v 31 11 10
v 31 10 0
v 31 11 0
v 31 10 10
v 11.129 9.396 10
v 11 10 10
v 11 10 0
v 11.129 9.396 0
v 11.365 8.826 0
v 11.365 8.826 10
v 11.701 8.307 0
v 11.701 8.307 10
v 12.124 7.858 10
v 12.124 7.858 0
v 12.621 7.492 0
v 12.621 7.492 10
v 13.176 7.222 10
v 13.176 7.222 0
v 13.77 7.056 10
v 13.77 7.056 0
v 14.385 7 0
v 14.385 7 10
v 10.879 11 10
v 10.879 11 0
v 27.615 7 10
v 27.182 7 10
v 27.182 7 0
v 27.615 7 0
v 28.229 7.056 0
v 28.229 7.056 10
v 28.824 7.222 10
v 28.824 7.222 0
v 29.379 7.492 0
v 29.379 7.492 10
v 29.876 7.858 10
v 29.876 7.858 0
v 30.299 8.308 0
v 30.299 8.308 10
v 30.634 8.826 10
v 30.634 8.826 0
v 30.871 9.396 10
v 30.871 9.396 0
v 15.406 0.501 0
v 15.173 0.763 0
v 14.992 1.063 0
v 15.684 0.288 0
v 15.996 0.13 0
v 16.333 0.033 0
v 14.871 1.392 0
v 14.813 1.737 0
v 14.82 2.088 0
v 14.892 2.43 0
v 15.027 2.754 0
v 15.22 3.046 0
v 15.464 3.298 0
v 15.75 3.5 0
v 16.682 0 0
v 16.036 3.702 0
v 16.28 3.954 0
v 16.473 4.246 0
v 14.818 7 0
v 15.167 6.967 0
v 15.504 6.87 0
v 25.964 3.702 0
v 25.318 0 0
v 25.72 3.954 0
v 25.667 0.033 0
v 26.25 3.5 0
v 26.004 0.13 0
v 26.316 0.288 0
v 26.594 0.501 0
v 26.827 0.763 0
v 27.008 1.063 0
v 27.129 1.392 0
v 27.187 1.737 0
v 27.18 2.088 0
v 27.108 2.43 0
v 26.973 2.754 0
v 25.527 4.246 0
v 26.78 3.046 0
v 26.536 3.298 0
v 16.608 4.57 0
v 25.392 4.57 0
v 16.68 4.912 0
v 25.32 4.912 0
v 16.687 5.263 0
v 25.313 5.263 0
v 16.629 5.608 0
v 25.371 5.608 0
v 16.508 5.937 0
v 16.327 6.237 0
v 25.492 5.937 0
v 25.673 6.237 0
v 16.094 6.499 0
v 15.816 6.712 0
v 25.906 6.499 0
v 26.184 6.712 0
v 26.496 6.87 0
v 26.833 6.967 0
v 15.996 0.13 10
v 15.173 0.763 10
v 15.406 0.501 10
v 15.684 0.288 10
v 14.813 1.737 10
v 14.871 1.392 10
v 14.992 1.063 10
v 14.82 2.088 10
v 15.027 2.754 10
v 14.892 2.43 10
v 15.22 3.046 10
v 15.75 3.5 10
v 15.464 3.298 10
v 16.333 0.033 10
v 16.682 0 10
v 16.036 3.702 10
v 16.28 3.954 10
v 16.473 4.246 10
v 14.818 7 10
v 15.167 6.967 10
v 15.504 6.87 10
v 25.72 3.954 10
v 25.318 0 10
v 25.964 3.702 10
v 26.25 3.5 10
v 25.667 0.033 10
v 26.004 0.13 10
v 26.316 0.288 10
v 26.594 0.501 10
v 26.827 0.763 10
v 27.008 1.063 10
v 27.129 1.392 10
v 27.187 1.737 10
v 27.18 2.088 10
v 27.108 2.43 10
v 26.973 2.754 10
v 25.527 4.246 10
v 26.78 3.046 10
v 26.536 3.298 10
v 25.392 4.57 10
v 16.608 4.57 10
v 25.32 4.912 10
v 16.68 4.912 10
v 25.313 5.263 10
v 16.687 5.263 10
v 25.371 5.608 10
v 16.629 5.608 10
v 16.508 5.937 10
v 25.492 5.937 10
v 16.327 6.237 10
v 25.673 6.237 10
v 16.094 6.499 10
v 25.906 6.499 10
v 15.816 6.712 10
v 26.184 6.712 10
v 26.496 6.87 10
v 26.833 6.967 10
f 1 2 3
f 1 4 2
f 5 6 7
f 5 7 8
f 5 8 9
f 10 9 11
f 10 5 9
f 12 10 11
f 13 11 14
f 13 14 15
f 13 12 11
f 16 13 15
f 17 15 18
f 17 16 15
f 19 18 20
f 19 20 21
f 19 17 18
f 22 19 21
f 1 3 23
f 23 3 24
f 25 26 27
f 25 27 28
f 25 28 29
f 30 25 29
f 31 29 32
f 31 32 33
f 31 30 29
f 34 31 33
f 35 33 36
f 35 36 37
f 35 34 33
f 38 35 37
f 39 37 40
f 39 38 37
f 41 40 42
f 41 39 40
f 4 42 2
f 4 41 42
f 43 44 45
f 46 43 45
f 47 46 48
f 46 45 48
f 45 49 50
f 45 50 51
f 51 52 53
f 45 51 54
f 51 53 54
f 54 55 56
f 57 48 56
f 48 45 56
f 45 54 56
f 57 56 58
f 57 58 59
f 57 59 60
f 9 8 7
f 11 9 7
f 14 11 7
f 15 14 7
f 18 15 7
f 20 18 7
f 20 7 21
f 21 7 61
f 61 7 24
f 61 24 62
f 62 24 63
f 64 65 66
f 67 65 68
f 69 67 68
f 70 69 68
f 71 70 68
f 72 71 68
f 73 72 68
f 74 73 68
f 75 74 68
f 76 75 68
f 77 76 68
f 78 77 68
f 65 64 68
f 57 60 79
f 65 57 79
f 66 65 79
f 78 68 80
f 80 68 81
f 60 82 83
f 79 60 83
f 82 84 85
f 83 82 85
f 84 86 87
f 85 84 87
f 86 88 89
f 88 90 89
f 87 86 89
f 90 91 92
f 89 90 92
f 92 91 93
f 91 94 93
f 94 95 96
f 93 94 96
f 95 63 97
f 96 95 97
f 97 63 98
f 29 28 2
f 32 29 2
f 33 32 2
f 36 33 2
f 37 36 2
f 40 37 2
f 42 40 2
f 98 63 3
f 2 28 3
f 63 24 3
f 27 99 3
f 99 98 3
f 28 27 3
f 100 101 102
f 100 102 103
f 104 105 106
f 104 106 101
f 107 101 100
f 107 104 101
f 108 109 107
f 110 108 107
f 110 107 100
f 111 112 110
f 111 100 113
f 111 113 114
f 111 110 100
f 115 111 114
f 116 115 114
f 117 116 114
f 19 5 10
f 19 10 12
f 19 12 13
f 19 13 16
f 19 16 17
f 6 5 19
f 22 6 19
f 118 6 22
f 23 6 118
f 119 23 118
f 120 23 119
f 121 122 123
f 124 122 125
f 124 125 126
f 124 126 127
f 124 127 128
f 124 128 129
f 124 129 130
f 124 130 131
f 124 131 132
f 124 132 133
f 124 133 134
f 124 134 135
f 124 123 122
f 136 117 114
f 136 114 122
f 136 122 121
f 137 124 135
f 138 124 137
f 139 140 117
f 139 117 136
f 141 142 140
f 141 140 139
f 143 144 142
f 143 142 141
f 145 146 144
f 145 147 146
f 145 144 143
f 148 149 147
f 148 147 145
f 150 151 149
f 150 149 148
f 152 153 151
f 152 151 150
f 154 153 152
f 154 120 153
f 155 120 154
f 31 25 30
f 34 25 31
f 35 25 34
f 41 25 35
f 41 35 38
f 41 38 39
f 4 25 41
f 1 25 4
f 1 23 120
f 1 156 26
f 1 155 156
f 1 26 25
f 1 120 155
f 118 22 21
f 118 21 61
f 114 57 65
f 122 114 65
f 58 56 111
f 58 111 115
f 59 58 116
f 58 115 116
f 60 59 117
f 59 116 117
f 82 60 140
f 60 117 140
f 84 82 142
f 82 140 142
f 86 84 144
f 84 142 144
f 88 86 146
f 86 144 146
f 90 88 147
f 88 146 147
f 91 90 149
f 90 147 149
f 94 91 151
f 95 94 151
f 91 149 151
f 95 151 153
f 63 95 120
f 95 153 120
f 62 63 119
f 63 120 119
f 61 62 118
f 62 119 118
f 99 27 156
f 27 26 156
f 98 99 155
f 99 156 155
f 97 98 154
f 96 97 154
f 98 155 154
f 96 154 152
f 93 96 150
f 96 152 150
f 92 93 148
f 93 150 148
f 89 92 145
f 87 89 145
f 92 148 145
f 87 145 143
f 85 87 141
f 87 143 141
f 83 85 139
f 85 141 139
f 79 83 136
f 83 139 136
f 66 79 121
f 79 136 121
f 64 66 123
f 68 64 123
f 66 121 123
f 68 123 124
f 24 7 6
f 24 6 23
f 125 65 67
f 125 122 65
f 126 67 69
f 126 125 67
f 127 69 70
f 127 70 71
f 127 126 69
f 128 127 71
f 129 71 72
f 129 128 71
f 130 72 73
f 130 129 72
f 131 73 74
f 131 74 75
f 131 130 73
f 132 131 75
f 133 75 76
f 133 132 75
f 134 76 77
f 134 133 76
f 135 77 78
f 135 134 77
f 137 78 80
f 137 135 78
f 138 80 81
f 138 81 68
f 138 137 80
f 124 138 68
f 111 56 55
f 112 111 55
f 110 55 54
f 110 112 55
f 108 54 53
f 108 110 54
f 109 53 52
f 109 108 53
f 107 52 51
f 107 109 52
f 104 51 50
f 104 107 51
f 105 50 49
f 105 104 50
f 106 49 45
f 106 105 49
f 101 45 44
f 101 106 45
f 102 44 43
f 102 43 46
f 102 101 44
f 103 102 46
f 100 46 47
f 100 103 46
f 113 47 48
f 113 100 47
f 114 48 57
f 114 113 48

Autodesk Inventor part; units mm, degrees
ref_plane "YZ Plane" through (0, 0, 0) normal (1, 0, 0) x (0, 1, 0)
ref_plane "XZ Plane" through (0, 0, 0) normal (0, 1, 0) x (-1, 0, 0)
ref_plane "XY Plane" through (0, 0, 0) normal (0, 0, 1) x (1, 0, 0)
sketch "Sketch1" plane through (0, 0, 0) normal (0, 0, 1) x (1, 0, 0)
  line L0 (0, 0) -> (21, 0)
  line L1 (21, 0) -> (21, 11)
  line L2 (21, 11) -> (0, 11)
  line L3 (0, 11) -> (0, 0)
  dimension "d0" = 21
  dimension "d1" = 11
extrude "Extrusion1" add sketch "Sketch1" along normal blind 10
sketch "Sketch2" plane through (0, 0, 10) normal (0, 0, 1) x (1, 0, 0)
  line L0 (0, 0) -> (21, 0) projected
  arc A0 (4.3181, 0) -> (5.25, 3.5) centre (4.3181, 1.8741) ccw
  arc A1 (6.1819, 7) -> (5.25, 3.5) centre (6.1819, 5.1259) ccw
  arc A2 (15.75, 3.5) -> (16.6819, 0) centre (16.6819, 1.8741) ccw
  arc A3 (15.75, 3.5) -> (14.8181, 7) centre (14.8181, 5.1259) ccw
  line L1 (6.1819, 7) -> (14.8181, 7)
  line L2 (21, 11) -> (0, 11) projected
  line L3 (4.3181, 1.8741) -> (6.1819, 5.1259) construction
  line L4 (16.6819, 1.8741) -> (14.8181, 5.1259) construction
  line L5 (0, 11) -> (0, 0) construction
  line L6 (21, 0) -> (21, 11) construction
  point P0 (10.5, 7)
  point P1 (15.75, 3.5)
  dimension "d7" = 10.5
  dimension "d9" = 7
  dimension "d13" = 10.5
extrude "Extrusion2" cut sketch "Sketch2" against normal through all
sketch "Sketch3" plane through (0, 0, 10) normal (0, 0, 1) x (1, 0, 0)
  line L0 (21, 11) -> (0, 11) projected
  line L1 (14.8181, 7) -> (6.1819, 7) projected
  arc A0 (6.6147, 7) -> (10, 10) centre (6.6147, 10.41) ccw
  arc A1 (11, 10) -> (14.3853, 7) centre (14.3853, 10.41) ccw
  line L2 (10, 10) -> (11, 10)
  line L3 (6.1819, 7) -> (14.8181, 7) projected
  line L4 (10.5, 10) -> (10.5, 11) construction
  point P0 (0, 0)
  dimension "d15" = 1
  dimension "d16" = 1
extrude "Extrusion3" cut sketch "Sketch3" against normal through all
pattern_linear "Rectangular Pattern1" count 6 spacing 21 along (1, 0, 0)
sketch "Sketch4" plane through (0, 0, 10) normal (0, 0, 1) x (1, 0, 0)
  line L0 (115, 10) -> (116, 10) projected
  line L1 (115, 10) -> (115, 11)
  line L2 (126, 11) -> (0, 11) projected
  line L3 (121.6819, 0) -> (126, 0) projected
  line L4 (121.6819, 0) -> (126, 0)
  line L5 (126, 0) -> (126, 11)
  line L6 (126, 0) -> (126, 11) projected
  line L7 (126, 11) -> (115, 11)
  arc A0 (116, 10) -> (119.3853, 7) centre (119.3853, 10.41) ccw projected
  line L8 (115, 10) -> (116, 10)
  line L9 (119.3853, 7) -> (119.8181, 7) projected
  arc A1 (116, 10) -> (119.3853, 7) centre (119.3853, 10.41) ccw
  arc A2 (120.75, 3.5) -> (119.8181, 7) centre (119.8181, 5.1259) ccw projected
  line L10 (119.3853, 7) -> (119.8181, 7)
  arc A3 (120.75, 3.5) -> (119.8181, 7) centre (119.8181, 5.1259) ccw
  arc A4 (120.75, 3.5) -> (121.6819, 0) centre (121.6819, 1.8741) ccw projected
  arc A5 (120.75, 3.5) -> (121.6819, 0) centre (121.6819, 1.8741) ccw
  line L11 (32, 10) -> (31, 10) projected
  line L12 (31, 10) -> (31, 11)
  line L13 (31, 10) -> (31, 0)
  line L14 (31, 0) -> (126, 0)
  line L15 (126, 11) -> (31, 11)
  arc A6 (11, 10) -> (14.3853, 7) centre (14.3853, 10.41) ccw projected
  line L16 (11, 10) -> (10.8789, 11)
  line L17 (10.8789, 11) -> (0, 11)
  line L18 (0, 11) -> (0, 0)
  line L19 (0, 0) -> (11, 0)
  line L20 (11, 0) -> (11, 10)
  point P0 (11, 11)
extrude "Extrusion4" cut sketch "Sketch4" against normal through all
sketch "Sketch5" plane through (0, 0, 10) normal (0, 0, 1) x (1, 0, 0)
  line L0 (31, 11) -> (10.8789, 11) projected
  line L1 (15.75, 3.5) -> (12.112, 9.8474) construction
  arc A0 (15.75, 3.5) -> (16.6819, 0) centre (16.6819, 1.8741) ccw construction
  line L2 (11.7707, 1.2193) -> (15.75, 3.5) construction
  arc A1 (15.75, 3.5) -> (14.8181, 7) centre (14.8181, 5.1259) ccw construction
  line L3 (15.75, 3.5) -> (19.849, 5.8494) construction
  arc A2 (25.3181, 0) -> (26.25, 3.5) centre (25.3181, 1.8741) ccw construction
  line L4 (26.25, 3.5) -> (29.888, 9.8474) construction
  line L5 (23.4673, 5.0949) -> (26.25, 3.5) construction
  line L6 (26.25, 3.5) -> (28.9514, 1.9517) construction
  arc A3 (25.3181, 0) -> (26.25, 3.5) centre (25.3181, 1.8741) ccw construction
  line L7 (12.112, 9.8474) -> (8.7461, 15.7199) construction
  line L8 (29.888, 9.8474) -> (33.5756, 16.2813) construction
  line L9 (21.2593, -5.2075) -> (20.7407, -6.1122) construction
  arc A4 (15.75, 3.5) -> (16.6819, 0) centre (16.6819, 1.8741) ccw construction
  arc A5 (15.75, 3.5) -> (14.8181, 7) centre (14.8181, 5.1259) ccw construction
  arc A6 (27.1819, 7) -> (26.25, 3.5) centre (27.1819, 5.1259) ccw construction
properties part number "Zipperteethv4.2"
